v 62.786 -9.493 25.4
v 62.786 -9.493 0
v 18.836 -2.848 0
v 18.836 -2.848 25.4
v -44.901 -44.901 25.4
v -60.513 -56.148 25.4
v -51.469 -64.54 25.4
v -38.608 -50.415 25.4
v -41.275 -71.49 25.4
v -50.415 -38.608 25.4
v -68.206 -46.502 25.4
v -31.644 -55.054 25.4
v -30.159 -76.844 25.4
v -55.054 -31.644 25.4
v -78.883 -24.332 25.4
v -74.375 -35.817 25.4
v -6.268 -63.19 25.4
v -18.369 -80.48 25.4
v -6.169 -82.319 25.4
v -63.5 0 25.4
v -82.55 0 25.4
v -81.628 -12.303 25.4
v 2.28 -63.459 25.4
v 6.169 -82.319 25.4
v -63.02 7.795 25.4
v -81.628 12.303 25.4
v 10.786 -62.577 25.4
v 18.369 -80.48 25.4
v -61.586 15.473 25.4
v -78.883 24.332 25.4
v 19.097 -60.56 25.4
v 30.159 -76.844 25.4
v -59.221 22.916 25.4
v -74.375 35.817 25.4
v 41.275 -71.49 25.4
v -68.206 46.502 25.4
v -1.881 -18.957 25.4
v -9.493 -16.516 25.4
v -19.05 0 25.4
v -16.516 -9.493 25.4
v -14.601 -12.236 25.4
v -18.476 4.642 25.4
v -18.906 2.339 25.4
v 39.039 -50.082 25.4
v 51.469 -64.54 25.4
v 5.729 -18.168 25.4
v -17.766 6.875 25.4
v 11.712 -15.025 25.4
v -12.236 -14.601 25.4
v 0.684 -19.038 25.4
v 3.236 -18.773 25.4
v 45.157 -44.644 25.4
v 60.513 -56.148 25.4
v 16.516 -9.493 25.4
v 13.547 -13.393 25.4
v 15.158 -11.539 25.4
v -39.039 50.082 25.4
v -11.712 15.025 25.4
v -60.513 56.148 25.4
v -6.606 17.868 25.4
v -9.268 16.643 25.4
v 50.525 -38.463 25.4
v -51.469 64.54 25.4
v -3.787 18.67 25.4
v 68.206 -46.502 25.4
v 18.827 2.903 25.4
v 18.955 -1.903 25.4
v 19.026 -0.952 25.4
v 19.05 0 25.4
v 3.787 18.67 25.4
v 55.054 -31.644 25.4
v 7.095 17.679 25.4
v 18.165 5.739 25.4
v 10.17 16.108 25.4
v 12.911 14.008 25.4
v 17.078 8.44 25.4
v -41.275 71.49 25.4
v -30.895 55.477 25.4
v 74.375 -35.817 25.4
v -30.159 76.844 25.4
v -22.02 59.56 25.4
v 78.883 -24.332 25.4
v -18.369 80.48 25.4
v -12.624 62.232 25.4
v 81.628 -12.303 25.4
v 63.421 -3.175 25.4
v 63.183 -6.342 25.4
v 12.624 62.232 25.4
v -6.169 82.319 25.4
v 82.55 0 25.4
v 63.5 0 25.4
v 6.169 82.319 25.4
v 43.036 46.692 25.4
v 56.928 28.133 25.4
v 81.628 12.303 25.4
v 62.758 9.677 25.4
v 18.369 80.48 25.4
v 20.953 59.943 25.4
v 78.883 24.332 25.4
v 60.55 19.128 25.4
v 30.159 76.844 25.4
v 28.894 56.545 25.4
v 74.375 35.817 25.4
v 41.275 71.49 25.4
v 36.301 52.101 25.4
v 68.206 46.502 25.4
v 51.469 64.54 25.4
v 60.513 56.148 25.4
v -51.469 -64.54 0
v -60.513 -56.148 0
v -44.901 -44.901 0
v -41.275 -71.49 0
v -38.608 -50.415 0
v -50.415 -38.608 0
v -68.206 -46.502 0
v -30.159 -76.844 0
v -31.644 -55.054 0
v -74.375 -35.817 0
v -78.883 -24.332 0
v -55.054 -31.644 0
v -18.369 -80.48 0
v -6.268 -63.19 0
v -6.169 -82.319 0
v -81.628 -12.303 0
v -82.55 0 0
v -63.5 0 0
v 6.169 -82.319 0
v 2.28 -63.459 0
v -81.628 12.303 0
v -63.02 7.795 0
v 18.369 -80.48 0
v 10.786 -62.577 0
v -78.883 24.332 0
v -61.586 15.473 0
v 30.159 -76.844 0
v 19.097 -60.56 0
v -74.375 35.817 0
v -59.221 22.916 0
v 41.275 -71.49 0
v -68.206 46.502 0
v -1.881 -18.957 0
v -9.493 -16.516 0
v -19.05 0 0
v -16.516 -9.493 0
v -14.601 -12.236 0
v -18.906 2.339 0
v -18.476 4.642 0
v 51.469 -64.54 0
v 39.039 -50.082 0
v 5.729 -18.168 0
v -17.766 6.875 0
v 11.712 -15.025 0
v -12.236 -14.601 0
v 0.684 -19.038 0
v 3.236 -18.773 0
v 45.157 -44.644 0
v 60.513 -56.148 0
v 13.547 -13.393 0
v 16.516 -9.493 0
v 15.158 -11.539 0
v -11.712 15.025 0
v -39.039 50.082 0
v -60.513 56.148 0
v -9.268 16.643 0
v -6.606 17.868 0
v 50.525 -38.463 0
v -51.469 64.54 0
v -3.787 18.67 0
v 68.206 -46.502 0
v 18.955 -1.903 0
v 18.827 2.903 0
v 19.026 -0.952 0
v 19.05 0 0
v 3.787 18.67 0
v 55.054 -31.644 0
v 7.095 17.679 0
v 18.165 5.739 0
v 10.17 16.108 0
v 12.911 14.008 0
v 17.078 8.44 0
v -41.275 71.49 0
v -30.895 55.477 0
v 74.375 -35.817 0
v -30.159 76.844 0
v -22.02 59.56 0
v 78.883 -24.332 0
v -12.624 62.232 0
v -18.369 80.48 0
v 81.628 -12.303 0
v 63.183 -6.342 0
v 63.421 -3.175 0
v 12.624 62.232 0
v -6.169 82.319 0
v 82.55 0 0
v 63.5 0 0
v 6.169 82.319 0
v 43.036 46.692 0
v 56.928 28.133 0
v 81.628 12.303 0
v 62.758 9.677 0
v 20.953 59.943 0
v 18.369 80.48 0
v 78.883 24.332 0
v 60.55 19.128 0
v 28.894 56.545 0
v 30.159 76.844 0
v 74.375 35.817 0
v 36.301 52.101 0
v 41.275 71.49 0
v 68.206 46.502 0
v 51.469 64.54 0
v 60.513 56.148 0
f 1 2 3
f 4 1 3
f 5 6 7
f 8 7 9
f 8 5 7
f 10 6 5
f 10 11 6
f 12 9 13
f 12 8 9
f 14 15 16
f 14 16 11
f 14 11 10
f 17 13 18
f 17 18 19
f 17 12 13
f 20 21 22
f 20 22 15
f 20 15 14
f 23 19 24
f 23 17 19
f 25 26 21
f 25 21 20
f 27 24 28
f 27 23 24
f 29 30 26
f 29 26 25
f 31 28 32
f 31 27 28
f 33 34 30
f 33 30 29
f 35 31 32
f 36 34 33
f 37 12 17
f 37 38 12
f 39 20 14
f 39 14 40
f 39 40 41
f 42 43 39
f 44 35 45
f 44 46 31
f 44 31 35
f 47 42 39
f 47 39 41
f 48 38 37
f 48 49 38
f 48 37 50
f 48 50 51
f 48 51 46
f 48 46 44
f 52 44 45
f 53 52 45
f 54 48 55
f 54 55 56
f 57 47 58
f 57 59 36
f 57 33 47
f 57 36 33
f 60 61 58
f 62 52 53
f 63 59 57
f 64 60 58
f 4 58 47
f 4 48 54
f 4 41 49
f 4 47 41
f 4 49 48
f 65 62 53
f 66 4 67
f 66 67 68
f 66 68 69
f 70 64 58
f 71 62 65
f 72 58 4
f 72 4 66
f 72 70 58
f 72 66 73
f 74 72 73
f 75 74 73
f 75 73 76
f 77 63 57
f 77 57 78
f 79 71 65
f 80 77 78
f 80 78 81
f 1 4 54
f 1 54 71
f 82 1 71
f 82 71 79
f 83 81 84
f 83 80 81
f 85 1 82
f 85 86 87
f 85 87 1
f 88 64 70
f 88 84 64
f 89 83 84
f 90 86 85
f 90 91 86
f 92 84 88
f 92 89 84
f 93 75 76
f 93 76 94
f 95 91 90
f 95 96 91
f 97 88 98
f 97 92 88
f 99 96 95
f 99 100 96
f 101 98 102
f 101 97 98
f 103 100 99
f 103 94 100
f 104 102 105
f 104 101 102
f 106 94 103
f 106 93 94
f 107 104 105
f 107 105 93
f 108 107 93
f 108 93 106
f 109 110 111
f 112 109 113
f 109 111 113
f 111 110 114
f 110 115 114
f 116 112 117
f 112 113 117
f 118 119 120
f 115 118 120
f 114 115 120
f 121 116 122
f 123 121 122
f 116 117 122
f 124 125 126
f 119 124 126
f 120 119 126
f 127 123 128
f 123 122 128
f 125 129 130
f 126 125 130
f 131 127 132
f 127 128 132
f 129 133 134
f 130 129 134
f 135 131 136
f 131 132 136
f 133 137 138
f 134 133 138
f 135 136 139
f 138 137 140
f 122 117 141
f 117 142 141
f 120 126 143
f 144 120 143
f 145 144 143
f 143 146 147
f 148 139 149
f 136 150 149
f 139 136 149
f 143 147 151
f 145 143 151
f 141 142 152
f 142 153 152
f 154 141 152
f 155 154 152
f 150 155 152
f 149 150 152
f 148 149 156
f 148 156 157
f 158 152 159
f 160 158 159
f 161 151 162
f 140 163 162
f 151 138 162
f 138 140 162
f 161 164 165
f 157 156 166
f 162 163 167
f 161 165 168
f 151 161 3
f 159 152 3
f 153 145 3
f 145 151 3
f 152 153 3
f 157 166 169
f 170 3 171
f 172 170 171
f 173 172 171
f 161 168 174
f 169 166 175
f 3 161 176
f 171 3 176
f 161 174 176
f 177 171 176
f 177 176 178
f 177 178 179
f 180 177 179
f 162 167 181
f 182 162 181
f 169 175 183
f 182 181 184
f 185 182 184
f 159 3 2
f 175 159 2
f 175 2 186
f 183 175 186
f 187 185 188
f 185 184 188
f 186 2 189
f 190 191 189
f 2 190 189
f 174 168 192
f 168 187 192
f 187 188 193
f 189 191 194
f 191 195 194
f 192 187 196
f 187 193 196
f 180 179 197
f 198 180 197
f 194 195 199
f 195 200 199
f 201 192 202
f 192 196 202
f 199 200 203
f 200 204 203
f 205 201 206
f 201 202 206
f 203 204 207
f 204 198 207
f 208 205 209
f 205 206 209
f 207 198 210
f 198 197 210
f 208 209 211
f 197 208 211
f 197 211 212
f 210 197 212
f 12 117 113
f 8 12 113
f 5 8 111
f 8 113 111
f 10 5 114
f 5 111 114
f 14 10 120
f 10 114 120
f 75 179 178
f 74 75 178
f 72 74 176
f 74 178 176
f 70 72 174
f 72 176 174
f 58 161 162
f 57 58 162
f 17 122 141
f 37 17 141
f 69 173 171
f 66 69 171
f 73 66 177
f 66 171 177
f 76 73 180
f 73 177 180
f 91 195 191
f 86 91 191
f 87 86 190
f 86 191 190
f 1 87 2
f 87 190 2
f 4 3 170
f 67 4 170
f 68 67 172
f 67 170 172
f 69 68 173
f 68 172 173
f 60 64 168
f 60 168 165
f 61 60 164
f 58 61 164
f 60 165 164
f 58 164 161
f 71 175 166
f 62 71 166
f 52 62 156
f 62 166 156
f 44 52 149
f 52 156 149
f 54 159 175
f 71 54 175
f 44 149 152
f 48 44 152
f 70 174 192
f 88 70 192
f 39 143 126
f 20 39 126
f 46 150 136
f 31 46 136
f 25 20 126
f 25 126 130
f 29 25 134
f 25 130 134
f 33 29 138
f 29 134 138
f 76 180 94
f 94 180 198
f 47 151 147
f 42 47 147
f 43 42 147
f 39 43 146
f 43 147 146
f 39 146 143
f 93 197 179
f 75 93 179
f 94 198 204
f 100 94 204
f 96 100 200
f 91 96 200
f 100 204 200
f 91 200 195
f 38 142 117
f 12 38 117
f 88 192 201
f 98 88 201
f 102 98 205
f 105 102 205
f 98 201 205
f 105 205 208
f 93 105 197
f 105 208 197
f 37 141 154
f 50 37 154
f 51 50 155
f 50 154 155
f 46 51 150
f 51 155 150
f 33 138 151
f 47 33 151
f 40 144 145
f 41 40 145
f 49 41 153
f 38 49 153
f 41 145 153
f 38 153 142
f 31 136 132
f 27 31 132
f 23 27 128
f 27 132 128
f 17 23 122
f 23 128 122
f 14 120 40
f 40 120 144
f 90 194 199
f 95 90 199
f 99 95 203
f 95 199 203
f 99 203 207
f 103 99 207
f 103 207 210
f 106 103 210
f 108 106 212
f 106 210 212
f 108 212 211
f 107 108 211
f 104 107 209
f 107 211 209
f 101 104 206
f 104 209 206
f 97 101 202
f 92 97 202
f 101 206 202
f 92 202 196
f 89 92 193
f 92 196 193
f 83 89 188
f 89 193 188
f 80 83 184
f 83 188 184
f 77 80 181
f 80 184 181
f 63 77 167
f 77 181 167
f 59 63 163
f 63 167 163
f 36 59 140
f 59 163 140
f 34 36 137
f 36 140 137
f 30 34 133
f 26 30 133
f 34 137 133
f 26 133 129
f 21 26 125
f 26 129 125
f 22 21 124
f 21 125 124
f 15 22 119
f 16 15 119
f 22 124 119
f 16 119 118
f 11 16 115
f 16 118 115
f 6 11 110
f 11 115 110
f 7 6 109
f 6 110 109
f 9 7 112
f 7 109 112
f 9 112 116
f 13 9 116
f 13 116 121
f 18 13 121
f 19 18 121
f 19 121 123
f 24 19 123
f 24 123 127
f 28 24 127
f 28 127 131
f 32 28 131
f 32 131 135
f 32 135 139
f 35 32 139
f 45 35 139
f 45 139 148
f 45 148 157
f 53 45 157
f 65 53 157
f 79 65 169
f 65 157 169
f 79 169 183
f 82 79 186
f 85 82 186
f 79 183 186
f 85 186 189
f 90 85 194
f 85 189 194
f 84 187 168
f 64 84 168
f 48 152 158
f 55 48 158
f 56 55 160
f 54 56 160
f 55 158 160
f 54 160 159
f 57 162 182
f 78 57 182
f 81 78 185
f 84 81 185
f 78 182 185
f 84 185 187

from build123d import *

# Parameters (mm, degrees)
F0_R     = 82.55
F1_DEPTH = 25.4
F2_DEPTH = 25.4


with BuildPart() as f1:
    # F0 (on Top) → F1 (new body)
    with BuildSketch(Plane.XY):
        Circle(F0_R)
        with BuildLine():
            ThreePointArc((56.928029, 28.132713), (61.835183, 14.445071), (63.5, 0))
            ThreePointArc((63.5, 0), (63.321347, -4.759933), (62.786395, -9.493083))
            ThreePointArc((62.786395, -9.493083), (59.952025, -20.928562), (55.053901, -31.643609))
            ThreePointArc((55.053901, -31.643609), (47.94106, -41.640183), (39.038578, -50.082327))
            ThreePointArc((39.038578, -50.082327), (29.536178, -56.212669), (19.097084, -60.560312))
            ThreePointArc((19.097084, -60.560312), (6.547713, -63.161519), (-6.268377, -63.189852))
            ThreePointArc((-6.268377, -63.189852), (-19.387576, -60.467941), (-31.643609, -55.053901))
            ThreePointArc((-31.643609, -55.053901), (-44.901281, -44.901281), (-55.053901, -31.643609))
            ThreePointArc((-55.053901, -31.643609), (-61.35215, -16.375703), (-63.5, 0))
            ThreePointArc((-63.5, 0), (-62.421056, 11.655977), (-59.220888, 22.915855))
            ThreePointArc((-59.220888, 22.915855), (-50.972884, 37.868391), (-39.038578, 50.082327))
            ThreePointArc((-39.038578, 50.082327), (-26.536219, 57.689506), (-12.624355, 62.232433))
            ThreePointArc((-12.624355, 62.232433), (0, 63.5), (12.624355, 62.232433))
            ThreePointArc((12.624355, 62.232433), (28.894327, 56.545273), (43.035655, 46.692423))
            ThreePointArc((43.035655, 46.692423), (50.836013, 38.051935), (56.928029, 28.132713))
        make_face(mode=Mode.SUBTRACT)
    extrude(amount=F1_DEPTH)

    # F0 (on Top) → F2 (join)
    with BuildSketch(Plane.XY):
        with BuildLine():
            Line((-11.711573, 15.024698), (-39.038578, 50.082327))
            ThreePointArc((-39.038578, 50.082327), (-50.972884, 37.868391), (-59.220888, 22.915855))
            Line((-59.220888, 22.915855), (-17.766266, 6.874757))
            ThreePointArc((-17.766266, 6.874757), (-15.291865, 11.360517), (-11.711573, 15.024698))
        make_face()
        with BuildLine():
            Line((-19.05, 0), (-63.5, 0))
            ThreePointArc((-63.5, 0), (-61.35215, -16.375703), (-55.053901, -31.643609))
            Line((-55.053901, -31.643609), (-16.51617, -9.493083))
            ThreePointArc((-16.51617, -9.493083), (-18.405645, -4.912711), (-19.05, 0))
        make_face()
        with BuildLine():
            ThreePointArc((-31.643609, -55.053901), (-19.387576, -60.467941), (-6.268377, -63.189852))
            Line((-6.268377, -63.189852), (-1.880513, -18.956956))
            ThreePointArc((-1.880513, -18.956956), (-5.816273, -18.140382), (-9.493083, -16.51617))
            Line((-9.493083, -16.51617), (-31.643609, -55.053901))
        make_face()
        with BuildLine():
            ThreePointArc((19.097084, -60.560312), (29.536178, -56.212669), (39.038578, -50.082327))
            Line((39.038578, -50.082327), (11.711573, -15.024698))
            ThreePointArc((11.711573, -15.024698), (8.860853, -16.863801), (5.729125, -18.168094))
            Line((5.729125, -18.168094), (19.097084, -60.560312))
        make_face()
        with BuildLine():
            ThreePointArc((55.053901, -31.643609), (59.952025, -20.928562), (62.786395, -9.493083))
            Line((62.786395, -9.493083), (18.835918, -2.847925))
            ThreePointArc((18.835918, -2.847925), (17.985607, -6.278569), (16.51617, -9.493083))
            Line((16.51617, -9.493083), (55.053901, -31.643609))
        make_face()
        with BuildLine():
            Line((17.078409, 8.439814), (56.928029, 28.132713))
            ThreePointArc((56.928029, 28.132713), (50.836013, 38.051935), (43.035655, 46.692423))
            Line((43.035655, 46.692423), (12.910697, 14.007727))
            ThreePointArc((12.910697, 14.007727), (15.250804, 11.415581), (17.078409, 8.439814))
        make_face()
        with BuildLine():
            Line((3.787306, 18.66973), (12.624355, 62.232433))
            ThreePointArc((12.624355, 62.232433), (0, 63.5), (-12.624355, 62.232433))
            Line((-12.624355, 62.232433), (-3.787306, 18.66973))
            ThreePointArc((-3.787306, 18.66973), (0, 19.05), (3.787306, 18.66973))
        make_face()
        with BuildLine():
            ThreePointArc((19.05, 0), (18.550555, 4.333521), (17.078409, 8.439814))
            ThreePointArc((17.078409, 8.439814), (15.250804, 11.415581), (12.910697, 14.007727))
            ThreePointArc((12.910697, 14.007727), (8.668298, 16.963582), (3.787306, 18.66973))
            ThreePointArc((3.787306, 18.66973), (0, 19.05), (-3.787306, 18.66973))
            ThreePointArc((-3.787306, 18.66973), (-7.960866, 17.306852), (-11.711573, 15.024698))
            ThreePointArc((-11.711573, 15.024698), (-15.291865, 11.360517), (-17.766266, 6.874757))
            ThreePointArc((-17.766266, 6.874757), (-18.726317, 3.496793), (-19.05, 0))
            ThreePointArc((-19.05, 0), (-18.405645, -4.912711), (-16.51617, -9.493083))
            ThreePointArc((-16.51617, -9.493083), (-13.470384, -13.470384), (-9.493083, -16.51617))
            ThreePointArc((-9.493083, -16.51617), (-5.816273, -18.140382), (-1.880513, -18.956956))
            ThreePointArc((-1.880513, -18.956956), (1.964314, -18.948456), (5.729125, -18.168094))
            ThreePointArc((5.729125, -18.168094), (8.860853, -16.863801), (11.711573, -15.024698))
            ThreePointArc((11.711573, -15.024698), (14.382318, -12.492055), (16.51617, -9.493083))
            ThreePointArc((16.51617, -9.493083), (17.985607, -6.278569), (18.835918, -2.847925))
            ThreePointArc((18.835918, -2.847925), (18.996404, -1.42798), (19.05, 0))
        make_face()
    extrude(amount=F2_DEPTH)


solid = f1.part
